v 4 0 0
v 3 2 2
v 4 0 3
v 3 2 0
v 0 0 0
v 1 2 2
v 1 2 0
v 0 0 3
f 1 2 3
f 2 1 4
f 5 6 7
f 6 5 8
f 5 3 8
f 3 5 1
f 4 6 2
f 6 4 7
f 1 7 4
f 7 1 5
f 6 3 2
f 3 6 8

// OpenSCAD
core = 2;

spread = 1;
rise = 1;
height = core + rise;
width = core + (2 * spread);
depth = core;
 
intersection() {
    linear_extrude(height) polygon ([[0,0], [width,0],[width-spread,depth],[spread,depth]]);
     
    translate([width,depth,0]) 
        rotate([90,0,270]) 
            linear_extrude(width) 
                polygon([[0,0], [depth, 0], [depth,height], [0,height-rise]]);
}
 
